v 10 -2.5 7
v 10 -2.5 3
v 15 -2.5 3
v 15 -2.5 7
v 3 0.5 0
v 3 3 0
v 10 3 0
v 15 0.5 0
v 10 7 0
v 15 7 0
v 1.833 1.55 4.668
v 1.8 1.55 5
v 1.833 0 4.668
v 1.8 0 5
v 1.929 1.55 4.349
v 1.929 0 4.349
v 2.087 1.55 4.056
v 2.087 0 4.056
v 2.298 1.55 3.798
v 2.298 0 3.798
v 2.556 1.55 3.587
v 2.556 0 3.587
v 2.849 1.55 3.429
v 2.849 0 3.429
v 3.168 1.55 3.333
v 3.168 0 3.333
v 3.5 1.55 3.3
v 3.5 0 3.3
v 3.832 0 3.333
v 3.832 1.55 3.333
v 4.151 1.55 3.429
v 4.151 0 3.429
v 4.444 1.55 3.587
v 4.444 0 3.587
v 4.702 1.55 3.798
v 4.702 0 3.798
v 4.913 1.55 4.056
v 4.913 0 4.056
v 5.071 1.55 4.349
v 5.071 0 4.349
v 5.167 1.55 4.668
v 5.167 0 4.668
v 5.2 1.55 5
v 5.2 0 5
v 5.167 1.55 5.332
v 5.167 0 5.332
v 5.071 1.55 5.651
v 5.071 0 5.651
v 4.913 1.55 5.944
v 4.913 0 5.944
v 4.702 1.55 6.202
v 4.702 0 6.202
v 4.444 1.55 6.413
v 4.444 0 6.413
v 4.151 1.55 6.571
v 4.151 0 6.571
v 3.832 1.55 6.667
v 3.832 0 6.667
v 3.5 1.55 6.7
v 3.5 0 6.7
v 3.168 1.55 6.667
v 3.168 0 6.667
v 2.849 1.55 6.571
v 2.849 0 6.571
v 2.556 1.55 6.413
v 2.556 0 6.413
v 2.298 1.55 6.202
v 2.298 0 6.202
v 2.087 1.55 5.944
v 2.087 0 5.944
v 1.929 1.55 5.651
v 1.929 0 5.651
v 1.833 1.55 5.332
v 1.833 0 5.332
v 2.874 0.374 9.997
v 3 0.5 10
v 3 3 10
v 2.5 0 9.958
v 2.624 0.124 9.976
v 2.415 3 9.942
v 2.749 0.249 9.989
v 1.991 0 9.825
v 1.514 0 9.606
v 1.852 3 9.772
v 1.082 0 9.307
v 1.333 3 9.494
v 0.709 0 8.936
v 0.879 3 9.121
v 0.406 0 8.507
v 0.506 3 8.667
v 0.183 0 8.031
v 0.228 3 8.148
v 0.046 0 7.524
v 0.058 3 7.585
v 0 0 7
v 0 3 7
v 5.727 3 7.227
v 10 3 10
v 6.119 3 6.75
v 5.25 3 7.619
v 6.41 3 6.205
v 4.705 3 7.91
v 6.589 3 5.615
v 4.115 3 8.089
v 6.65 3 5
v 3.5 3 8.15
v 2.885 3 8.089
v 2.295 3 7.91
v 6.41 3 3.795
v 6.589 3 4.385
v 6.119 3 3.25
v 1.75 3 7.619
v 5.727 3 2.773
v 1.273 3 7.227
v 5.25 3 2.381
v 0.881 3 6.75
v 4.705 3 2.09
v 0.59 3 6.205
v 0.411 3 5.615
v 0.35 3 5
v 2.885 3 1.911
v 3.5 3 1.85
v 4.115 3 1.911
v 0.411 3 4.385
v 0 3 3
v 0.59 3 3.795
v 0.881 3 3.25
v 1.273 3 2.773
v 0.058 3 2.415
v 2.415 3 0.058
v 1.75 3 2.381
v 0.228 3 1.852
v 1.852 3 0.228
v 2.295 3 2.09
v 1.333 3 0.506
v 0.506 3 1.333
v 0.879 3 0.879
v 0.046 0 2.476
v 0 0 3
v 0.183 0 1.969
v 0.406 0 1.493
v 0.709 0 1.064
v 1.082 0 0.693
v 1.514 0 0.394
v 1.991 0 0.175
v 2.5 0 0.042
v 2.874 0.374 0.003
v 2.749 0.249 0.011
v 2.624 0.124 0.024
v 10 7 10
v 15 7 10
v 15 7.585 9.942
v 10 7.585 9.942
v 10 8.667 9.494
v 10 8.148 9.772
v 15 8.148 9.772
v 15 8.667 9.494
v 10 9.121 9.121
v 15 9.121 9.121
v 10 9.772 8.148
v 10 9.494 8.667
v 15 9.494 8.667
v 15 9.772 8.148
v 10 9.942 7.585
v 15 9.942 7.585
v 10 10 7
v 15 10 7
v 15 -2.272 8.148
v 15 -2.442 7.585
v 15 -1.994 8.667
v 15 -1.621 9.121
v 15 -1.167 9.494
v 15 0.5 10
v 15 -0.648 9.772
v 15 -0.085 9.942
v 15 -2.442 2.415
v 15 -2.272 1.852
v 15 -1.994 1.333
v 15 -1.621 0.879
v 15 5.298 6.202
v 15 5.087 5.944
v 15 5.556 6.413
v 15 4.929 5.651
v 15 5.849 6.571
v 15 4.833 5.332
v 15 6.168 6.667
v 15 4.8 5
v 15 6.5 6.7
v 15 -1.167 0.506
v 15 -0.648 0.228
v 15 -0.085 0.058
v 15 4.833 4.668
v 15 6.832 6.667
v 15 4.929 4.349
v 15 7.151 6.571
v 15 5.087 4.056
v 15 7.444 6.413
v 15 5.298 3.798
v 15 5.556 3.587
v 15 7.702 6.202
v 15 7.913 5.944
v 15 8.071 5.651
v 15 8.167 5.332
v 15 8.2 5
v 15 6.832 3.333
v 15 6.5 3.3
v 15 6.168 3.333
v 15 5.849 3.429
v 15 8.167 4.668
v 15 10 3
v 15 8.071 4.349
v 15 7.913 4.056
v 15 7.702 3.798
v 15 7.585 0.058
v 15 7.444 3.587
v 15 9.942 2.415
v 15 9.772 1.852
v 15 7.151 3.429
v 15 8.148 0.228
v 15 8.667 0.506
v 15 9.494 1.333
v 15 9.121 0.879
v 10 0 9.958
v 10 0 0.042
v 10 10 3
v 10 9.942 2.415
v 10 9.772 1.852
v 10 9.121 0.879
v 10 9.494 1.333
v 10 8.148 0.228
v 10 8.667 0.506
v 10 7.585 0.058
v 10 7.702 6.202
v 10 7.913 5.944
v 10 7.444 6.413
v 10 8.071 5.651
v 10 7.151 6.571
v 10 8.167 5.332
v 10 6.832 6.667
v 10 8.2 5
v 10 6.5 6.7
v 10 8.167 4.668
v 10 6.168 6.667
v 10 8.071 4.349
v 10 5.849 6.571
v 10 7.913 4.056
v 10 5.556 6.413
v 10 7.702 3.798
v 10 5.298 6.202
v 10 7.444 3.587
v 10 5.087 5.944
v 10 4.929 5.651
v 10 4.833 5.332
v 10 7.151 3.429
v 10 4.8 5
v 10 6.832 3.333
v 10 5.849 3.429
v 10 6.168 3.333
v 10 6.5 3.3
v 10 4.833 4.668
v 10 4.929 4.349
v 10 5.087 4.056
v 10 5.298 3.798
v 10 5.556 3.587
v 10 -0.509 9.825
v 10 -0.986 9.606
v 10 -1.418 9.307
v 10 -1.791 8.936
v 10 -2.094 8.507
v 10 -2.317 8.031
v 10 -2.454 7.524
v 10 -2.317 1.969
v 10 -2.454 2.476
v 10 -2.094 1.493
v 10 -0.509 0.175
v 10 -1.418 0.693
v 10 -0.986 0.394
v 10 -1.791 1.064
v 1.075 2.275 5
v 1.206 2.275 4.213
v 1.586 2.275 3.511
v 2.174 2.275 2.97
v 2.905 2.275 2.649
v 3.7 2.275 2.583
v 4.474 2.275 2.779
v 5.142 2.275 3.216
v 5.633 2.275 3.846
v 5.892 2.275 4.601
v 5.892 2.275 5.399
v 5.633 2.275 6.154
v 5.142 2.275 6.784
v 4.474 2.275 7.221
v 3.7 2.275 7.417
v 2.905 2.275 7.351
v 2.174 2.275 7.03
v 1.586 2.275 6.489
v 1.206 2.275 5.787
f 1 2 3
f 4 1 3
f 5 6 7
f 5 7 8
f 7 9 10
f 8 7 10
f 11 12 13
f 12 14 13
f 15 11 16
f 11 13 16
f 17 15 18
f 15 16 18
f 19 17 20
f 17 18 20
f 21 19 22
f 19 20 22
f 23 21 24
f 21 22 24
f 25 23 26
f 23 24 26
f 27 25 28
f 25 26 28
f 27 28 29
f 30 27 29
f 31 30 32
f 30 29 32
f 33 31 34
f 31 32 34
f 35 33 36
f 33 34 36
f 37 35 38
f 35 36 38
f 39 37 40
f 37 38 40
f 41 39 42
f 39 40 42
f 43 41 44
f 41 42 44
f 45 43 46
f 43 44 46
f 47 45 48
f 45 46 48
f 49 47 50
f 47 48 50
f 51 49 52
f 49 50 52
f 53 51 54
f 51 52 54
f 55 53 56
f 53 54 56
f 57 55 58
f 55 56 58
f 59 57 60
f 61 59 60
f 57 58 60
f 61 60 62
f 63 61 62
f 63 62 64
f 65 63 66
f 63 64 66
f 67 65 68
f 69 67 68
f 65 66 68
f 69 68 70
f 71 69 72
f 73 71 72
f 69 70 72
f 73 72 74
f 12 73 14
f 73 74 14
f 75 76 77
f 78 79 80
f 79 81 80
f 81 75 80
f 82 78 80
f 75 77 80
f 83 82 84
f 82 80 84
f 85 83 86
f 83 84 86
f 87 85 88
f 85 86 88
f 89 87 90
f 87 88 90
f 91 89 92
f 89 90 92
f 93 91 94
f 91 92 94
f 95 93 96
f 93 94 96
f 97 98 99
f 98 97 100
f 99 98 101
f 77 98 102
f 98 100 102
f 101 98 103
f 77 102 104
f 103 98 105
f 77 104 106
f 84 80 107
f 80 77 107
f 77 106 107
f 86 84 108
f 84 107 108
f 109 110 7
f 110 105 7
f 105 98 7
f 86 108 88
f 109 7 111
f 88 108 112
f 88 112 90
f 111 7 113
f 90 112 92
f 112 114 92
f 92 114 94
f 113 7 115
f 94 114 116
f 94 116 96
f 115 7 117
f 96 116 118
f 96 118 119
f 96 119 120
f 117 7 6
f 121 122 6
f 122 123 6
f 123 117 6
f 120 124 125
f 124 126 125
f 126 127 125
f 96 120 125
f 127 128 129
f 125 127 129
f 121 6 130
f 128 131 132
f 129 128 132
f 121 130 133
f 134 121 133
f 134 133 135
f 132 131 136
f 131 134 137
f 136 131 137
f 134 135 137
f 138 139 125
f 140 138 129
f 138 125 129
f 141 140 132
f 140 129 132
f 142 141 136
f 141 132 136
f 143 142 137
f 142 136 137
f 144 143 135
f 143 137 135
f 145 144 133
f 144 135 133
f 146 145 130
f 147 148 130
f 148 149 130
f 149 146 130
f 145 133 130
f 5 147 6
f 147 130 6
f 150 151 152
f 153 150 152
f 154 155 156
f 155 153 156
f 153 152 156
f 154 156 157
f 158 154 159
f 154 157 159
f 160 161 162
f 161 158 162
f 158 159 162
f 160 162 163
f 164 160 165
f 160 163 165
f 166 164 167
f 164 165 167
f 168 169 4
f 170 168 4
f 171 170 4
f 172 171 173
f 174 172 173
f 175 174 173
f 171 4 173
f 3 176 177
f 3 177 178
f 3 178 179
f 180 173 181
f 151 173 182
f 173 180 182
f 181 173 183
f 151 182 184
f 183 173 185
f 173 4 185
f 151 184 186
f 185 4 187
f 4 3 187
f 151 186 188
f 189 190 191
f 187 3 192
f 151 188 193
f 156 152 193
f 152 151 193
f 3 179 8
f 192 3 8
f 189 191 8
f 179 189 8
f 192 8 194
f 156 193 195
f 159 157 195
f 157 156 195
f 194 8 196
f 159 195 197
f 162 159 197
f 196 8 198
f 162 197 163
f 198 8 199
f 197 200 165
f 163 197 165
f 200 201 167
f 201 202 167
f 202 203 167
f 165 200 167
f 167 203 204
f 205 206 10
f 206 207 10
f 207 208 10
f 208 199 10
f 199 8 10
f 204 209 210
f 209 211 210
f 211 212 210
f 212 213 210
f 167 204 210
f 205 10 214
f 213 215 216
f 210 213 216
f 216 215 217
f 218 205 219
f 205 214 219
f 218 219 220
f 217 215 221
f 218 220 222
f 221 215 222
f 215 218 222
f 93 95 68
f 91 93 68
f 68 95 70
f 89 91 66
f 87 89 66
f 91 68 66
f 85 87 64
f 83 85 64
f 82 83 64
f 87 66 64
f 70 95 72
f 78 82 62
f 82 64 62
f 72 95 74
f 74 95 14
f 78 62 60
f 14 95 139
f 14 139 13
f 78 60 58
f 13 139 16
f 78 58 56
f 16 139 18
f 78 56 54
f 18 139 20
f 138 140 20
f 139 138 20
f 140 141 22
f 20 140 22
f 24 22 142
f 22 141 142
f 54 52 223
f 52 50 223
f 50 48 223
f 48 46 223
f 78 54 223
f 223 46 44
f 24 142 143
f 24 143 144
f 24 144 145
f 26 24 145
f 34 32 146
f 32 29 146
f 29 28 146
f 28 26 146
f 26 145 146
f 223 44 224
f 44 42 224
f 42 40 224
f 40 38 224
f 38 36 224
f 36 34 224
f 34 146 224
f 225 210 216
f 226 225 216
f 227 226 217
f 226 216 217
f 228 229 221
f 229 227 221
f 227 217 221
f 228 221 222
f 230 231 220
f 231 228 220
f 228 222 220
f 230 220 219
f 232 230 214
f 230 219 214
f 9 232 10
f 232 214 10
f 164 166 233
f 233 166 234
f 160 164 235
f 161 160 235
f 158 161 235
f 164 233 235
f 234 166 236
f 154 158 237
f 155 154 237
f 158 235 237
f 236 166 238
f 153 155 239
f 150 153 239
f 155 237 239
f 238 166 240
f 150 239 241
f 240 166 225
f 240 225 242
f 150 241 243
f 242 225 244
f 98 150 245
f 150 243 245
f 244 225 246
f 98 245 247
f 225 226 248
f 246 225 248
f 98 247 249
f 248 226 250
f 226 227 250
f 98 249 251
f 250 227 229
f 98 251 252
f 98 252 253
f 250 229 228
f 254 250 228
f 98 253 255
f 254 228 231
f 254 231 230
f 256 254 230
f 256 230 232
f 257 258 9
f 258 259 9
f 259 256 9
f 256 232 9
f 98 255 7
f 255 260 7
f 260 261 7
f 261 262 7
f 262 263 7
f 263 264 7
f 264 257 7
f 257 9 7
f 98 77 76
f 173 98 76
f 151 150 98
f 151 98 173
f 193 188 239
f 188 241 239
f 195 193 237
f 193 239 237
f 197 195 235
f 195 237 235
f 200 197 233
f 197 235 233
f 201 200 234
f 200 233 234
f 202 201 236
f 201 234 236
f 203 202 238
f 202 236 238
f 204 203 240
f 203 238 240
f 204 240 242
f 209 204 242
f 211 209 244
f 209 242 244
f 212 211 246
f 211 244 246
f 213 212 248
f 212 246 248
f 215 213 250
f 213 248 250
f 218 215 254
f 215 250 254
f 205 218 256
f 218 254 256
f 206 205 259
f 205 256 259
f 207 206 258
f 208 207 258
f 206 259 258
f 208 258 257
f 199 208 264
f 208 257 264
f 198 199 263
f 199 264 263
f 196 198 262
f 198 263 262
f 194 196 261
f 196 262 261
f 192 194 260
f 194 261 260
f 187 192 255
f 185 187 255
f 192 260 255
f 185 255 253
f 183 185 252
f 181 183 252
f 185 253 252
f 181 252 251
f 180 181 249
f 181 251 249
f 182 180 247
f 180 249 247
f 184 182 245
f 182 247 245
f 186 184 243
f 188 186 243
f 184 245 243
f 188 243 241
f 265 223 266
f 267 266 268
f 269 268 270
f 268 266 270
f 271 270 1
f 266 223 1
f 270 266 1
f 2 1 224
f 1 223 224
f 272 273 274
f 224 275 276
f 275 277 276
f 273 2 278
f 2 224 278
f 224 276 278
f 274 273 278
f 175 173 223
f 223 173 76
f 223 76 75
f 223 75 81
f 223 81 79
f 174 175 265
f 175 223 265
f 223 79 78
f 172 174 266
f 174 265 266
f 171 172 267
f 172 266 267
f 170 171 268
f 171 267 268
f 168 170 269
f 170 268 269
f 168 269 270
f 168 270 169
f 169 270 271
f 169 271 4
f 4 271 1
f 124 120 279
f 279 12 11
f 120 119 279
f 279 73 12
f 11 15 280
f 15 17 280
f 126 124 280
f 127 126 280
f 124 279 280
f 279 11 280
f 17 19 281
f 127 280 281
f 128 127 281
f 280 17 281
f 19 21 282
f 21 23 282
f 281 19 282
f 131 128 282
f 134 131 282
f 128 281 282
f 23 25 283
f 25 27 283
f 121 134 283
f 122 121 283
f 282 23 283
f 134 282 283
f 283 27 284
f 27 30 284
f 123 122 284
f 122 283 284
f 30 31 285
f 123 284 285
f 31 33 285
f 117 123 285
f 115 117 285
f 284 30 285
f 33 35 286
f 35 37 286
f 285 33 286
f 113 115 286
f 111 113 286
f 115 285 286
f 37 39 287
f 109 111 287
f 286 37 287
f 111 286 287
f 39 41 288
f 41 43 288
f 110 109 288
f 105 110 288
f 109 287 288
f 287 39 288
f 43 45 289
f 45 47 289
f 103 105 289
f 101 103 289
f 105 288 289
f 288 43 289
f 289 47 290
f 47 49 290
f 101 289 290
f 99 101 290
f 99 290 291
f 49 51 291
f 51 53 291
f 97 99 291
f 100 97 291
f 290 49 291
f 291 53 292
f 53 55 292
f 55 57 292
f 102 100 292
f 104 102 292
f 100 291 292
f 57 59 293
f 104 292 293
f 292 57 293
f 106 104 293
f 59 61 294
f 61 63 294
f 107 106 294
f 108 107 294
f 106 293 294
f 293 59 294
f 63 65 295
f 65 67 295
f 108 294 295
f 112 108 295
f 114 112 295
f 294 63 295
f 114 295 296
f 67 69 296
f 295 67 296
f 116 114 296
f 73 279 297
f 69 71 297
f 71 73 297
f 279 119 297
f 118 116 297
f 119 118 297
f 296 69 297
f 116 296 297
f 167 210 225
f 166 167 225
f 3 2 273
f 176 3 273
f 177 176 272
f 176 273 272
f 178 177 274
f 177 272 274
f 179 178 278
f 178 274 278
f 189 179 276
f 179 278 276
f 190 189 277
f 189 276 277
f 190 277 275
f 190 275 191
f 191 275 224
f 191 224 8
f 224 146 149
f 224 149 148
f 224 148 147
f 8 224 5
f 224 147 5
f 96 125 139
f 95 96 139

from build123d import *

# Parameters (mm, degrees)
BOSS_EXTRU_1_DEPTH                             = 10
ESQUISSE2_R                                    = 1.5
ENL_V_MAT_EXTRU_1_DEPTH                        = 5
ESQUISSE3_R                                    = 1.5
ENL_V_MAT_EXTRU_2_DEPTH                        = 3
D_GAGEMENT_M31_D                               = 3.4
D_GAGEMENT_M31_DEPTH                           = 5
D_GAGEMENT_M31_TIP                             = 1.021463052
FRAISAGE_POUR_VIS_T_TE_FRAIS_E_M31_D           = 3.4
FRAISAGE_POUR_VIS_T_TE_FRAIS_E_M31_DEPTH       = 3
FRAISAGE_POUR_VIS_T_TE_FRAIS_E_M31_CSINK_D     = 6.3
FRAISAGE_POUR_VIS_T_TE_FRAIS_E_M31_CSINK_ANGLE = 90
FRAISAGE_POUR_VIS_T_TE_FRAIS_E_M31_TIP         = 1.021463052
CONG_1_R                                       = 3


with BuildPart() as part:
    # Esquisse1 → Boss.-Extru.1 (new body)
    with BuildSketch(Plane.XY):
        Polygon((15, 0), (15, 10), (10, 10), (10, 3), (0, 3), (0, 0), (10, 0), (10, -2.5), (15, -2.5), align=None)
    extrude(amount=BOSS_EXTRU_1_DEPTH)

    # Esquisse2 → Enlèv. mat.-Extru.1 (cut)
    with BuildSketch(Plane(origin=(15, 0, 0), x_dir=(0, 0, -1), z_dir=(1, 0, 0))):
        with Locations((-5, 6.5)):
            Circle(ESQUISSE2_R)
    extrude(amount=-ENL_V_MAT_EXTRU_1_DEPTH, mode=Mode.SUBTRACT)

    # Esquisse3 → Enlèv. mat.-Extru.2 (cut)
    with BuildSketch(Plane(origin=(0, 3, 0), x_dir=(1, 0, 0), z_dir=(0, 1, 0))):
        with Locations(Location((3.5, -5, 0), (0, 0, 180))):
            Circle(ESQUISSE3_R)
    extrude(amount=-ENL_V_MAT_EXTRU_2_DEPTH, mode=Mode.SUBTRACT)

    # Dégagement M31
    with Locations(Plane(origin=(15, 0, 0), x_dir=(0, 0, -1), z_dir=(1, 0, 0))):
        with Locations((-5, 6.5)):
            Hole(D_GAGEMENT_M31_D / 2, depth=D_GAGEMENT_M31_DEPTH)
            with Locations((0, 0, -(D_GAGEMENT_M31_DEPTH + D_GAGEMENT_M31_TIP / 2))):  # 118° drill point
                Cone(0, D_GAGEMENT_M31_D / 2, D_GAGEMENT_M31_TIP, mode=Mode.SUBTRACT)

    # Fraisage pour vis à tête fraisée M31
    with Locations(Plane(origin=(0, 3, 0), x_dir=(1, 0, 0), z_dir=(0, 1, 0))):
        with Locations((3.5, -5)):
            CounterSinkHole(FRAISAGE_POUR_VIS_T_TE_FRAIS_E_M31_D / 2, FRAISAGE_POUR_VIS_T_TE_FRAIS_E_M31_CSINK_D / 2, depth=FRAISAGE_POUR_VIS_T_TE_FRAIS_E_M31_DEPTH, counter_sink_angle=FRAISAGE_POUR_VIS_T_TE_FRAIS_E_M31_CSINK_ANGLE)
            with Locations((0, 0, -(FRAISAGE_POUR_VIS_T_TE_FRAIS_E_M31_DEPTH + FRAISAGE_POUR_VIS_T_TE_FRAIS_E_M31_TIP / 2))):  # 118° drill point
                Cone(0, FRAISAGE_POUR_VIS_T_TE_FRAIS_E_M31_D / 2, FRAISAGE_POUR_VIS_T_TE_FRAIS_E_M31_TIP, mode=Mode.SUBTRACT)

    # Congé1
    # the kernel refuses this fillet: 3 mm, written as the material it takes off along each edge
    with BuildSketch(Plane(origin=(0, 10.5, 10), x_dir=(0, 0, -1), z_dir=(0, -1, 0))) as cong_1_piece_1:
        with BuildLine():
            CenterArc((CONG_1_R, CONG_1_R), CONG_1_R, 180, 90)
            Line((0, CONG_1_R), (0, 0))
            Line((0, 0), (CONG_1_R, 0))
        make_face()
    extrude(amount=18, mode=Mode.SUBTRACT)
    with BuildSketch(Plane(origin=(0, 10.5, 0), x_dir=(0, 0, 1), z_dir=(0, -1, 0))) as cong_1_piece_2:
        with BuildLine():
            CenterArc((CONG_1_R, -CONG_1_R), CONG_1_R, 90, 90)
            Line((0, -CONG_1_R), (0, 0))
            Line((0, 0), (CONG_1_R, 0))
        make_face()
    extrude(amount=18, mode=Mode.SUBTRACT)
    with BuildSketch(Plane(origin=(22.5, 10, 0), x_dir=(0, -1, 0), z_dir=(-1, 0, 0)), Plane(origin=(2.5, -2.5, 10), x_dir=(0, 0, -1), z_dir=(1, 0, 0))) as cong_1_piece_3:
        with BuildLine():
            CenterArc((CONG_1_R, CONG_1_R), CONG_1_R, 180, 90)
            Line((0, CONG_1_R), (0, 0))
            Line((0, 0), (CONG_1_R, 0))
        make_face()
    extrude(amount=20, mode=Mode.SUBTRACT)
    with BuildSketch(Plane(origin=(22.5, 10, 10), x_dir=(0, -1, 0), z_dir=(-1, 0, 0)), Plane(origin=(2.5, -2.5, 0), x_dir=(0, 0, 1), z_dir=(1, 0, 0))) as cong_1_piece_4:
        with BuildLine():
            CenterArc((CONG_1_R, -CONG_1_R), CONG_1_R, 90, 90)
            Line((0, -CONG_1_R), (0, 0))
            Line((0, 0), (CONG_1_R, 0))
        make_face()
    extrude(amount=20, mode=Mode.SUBTRACT)


solid = part.part
